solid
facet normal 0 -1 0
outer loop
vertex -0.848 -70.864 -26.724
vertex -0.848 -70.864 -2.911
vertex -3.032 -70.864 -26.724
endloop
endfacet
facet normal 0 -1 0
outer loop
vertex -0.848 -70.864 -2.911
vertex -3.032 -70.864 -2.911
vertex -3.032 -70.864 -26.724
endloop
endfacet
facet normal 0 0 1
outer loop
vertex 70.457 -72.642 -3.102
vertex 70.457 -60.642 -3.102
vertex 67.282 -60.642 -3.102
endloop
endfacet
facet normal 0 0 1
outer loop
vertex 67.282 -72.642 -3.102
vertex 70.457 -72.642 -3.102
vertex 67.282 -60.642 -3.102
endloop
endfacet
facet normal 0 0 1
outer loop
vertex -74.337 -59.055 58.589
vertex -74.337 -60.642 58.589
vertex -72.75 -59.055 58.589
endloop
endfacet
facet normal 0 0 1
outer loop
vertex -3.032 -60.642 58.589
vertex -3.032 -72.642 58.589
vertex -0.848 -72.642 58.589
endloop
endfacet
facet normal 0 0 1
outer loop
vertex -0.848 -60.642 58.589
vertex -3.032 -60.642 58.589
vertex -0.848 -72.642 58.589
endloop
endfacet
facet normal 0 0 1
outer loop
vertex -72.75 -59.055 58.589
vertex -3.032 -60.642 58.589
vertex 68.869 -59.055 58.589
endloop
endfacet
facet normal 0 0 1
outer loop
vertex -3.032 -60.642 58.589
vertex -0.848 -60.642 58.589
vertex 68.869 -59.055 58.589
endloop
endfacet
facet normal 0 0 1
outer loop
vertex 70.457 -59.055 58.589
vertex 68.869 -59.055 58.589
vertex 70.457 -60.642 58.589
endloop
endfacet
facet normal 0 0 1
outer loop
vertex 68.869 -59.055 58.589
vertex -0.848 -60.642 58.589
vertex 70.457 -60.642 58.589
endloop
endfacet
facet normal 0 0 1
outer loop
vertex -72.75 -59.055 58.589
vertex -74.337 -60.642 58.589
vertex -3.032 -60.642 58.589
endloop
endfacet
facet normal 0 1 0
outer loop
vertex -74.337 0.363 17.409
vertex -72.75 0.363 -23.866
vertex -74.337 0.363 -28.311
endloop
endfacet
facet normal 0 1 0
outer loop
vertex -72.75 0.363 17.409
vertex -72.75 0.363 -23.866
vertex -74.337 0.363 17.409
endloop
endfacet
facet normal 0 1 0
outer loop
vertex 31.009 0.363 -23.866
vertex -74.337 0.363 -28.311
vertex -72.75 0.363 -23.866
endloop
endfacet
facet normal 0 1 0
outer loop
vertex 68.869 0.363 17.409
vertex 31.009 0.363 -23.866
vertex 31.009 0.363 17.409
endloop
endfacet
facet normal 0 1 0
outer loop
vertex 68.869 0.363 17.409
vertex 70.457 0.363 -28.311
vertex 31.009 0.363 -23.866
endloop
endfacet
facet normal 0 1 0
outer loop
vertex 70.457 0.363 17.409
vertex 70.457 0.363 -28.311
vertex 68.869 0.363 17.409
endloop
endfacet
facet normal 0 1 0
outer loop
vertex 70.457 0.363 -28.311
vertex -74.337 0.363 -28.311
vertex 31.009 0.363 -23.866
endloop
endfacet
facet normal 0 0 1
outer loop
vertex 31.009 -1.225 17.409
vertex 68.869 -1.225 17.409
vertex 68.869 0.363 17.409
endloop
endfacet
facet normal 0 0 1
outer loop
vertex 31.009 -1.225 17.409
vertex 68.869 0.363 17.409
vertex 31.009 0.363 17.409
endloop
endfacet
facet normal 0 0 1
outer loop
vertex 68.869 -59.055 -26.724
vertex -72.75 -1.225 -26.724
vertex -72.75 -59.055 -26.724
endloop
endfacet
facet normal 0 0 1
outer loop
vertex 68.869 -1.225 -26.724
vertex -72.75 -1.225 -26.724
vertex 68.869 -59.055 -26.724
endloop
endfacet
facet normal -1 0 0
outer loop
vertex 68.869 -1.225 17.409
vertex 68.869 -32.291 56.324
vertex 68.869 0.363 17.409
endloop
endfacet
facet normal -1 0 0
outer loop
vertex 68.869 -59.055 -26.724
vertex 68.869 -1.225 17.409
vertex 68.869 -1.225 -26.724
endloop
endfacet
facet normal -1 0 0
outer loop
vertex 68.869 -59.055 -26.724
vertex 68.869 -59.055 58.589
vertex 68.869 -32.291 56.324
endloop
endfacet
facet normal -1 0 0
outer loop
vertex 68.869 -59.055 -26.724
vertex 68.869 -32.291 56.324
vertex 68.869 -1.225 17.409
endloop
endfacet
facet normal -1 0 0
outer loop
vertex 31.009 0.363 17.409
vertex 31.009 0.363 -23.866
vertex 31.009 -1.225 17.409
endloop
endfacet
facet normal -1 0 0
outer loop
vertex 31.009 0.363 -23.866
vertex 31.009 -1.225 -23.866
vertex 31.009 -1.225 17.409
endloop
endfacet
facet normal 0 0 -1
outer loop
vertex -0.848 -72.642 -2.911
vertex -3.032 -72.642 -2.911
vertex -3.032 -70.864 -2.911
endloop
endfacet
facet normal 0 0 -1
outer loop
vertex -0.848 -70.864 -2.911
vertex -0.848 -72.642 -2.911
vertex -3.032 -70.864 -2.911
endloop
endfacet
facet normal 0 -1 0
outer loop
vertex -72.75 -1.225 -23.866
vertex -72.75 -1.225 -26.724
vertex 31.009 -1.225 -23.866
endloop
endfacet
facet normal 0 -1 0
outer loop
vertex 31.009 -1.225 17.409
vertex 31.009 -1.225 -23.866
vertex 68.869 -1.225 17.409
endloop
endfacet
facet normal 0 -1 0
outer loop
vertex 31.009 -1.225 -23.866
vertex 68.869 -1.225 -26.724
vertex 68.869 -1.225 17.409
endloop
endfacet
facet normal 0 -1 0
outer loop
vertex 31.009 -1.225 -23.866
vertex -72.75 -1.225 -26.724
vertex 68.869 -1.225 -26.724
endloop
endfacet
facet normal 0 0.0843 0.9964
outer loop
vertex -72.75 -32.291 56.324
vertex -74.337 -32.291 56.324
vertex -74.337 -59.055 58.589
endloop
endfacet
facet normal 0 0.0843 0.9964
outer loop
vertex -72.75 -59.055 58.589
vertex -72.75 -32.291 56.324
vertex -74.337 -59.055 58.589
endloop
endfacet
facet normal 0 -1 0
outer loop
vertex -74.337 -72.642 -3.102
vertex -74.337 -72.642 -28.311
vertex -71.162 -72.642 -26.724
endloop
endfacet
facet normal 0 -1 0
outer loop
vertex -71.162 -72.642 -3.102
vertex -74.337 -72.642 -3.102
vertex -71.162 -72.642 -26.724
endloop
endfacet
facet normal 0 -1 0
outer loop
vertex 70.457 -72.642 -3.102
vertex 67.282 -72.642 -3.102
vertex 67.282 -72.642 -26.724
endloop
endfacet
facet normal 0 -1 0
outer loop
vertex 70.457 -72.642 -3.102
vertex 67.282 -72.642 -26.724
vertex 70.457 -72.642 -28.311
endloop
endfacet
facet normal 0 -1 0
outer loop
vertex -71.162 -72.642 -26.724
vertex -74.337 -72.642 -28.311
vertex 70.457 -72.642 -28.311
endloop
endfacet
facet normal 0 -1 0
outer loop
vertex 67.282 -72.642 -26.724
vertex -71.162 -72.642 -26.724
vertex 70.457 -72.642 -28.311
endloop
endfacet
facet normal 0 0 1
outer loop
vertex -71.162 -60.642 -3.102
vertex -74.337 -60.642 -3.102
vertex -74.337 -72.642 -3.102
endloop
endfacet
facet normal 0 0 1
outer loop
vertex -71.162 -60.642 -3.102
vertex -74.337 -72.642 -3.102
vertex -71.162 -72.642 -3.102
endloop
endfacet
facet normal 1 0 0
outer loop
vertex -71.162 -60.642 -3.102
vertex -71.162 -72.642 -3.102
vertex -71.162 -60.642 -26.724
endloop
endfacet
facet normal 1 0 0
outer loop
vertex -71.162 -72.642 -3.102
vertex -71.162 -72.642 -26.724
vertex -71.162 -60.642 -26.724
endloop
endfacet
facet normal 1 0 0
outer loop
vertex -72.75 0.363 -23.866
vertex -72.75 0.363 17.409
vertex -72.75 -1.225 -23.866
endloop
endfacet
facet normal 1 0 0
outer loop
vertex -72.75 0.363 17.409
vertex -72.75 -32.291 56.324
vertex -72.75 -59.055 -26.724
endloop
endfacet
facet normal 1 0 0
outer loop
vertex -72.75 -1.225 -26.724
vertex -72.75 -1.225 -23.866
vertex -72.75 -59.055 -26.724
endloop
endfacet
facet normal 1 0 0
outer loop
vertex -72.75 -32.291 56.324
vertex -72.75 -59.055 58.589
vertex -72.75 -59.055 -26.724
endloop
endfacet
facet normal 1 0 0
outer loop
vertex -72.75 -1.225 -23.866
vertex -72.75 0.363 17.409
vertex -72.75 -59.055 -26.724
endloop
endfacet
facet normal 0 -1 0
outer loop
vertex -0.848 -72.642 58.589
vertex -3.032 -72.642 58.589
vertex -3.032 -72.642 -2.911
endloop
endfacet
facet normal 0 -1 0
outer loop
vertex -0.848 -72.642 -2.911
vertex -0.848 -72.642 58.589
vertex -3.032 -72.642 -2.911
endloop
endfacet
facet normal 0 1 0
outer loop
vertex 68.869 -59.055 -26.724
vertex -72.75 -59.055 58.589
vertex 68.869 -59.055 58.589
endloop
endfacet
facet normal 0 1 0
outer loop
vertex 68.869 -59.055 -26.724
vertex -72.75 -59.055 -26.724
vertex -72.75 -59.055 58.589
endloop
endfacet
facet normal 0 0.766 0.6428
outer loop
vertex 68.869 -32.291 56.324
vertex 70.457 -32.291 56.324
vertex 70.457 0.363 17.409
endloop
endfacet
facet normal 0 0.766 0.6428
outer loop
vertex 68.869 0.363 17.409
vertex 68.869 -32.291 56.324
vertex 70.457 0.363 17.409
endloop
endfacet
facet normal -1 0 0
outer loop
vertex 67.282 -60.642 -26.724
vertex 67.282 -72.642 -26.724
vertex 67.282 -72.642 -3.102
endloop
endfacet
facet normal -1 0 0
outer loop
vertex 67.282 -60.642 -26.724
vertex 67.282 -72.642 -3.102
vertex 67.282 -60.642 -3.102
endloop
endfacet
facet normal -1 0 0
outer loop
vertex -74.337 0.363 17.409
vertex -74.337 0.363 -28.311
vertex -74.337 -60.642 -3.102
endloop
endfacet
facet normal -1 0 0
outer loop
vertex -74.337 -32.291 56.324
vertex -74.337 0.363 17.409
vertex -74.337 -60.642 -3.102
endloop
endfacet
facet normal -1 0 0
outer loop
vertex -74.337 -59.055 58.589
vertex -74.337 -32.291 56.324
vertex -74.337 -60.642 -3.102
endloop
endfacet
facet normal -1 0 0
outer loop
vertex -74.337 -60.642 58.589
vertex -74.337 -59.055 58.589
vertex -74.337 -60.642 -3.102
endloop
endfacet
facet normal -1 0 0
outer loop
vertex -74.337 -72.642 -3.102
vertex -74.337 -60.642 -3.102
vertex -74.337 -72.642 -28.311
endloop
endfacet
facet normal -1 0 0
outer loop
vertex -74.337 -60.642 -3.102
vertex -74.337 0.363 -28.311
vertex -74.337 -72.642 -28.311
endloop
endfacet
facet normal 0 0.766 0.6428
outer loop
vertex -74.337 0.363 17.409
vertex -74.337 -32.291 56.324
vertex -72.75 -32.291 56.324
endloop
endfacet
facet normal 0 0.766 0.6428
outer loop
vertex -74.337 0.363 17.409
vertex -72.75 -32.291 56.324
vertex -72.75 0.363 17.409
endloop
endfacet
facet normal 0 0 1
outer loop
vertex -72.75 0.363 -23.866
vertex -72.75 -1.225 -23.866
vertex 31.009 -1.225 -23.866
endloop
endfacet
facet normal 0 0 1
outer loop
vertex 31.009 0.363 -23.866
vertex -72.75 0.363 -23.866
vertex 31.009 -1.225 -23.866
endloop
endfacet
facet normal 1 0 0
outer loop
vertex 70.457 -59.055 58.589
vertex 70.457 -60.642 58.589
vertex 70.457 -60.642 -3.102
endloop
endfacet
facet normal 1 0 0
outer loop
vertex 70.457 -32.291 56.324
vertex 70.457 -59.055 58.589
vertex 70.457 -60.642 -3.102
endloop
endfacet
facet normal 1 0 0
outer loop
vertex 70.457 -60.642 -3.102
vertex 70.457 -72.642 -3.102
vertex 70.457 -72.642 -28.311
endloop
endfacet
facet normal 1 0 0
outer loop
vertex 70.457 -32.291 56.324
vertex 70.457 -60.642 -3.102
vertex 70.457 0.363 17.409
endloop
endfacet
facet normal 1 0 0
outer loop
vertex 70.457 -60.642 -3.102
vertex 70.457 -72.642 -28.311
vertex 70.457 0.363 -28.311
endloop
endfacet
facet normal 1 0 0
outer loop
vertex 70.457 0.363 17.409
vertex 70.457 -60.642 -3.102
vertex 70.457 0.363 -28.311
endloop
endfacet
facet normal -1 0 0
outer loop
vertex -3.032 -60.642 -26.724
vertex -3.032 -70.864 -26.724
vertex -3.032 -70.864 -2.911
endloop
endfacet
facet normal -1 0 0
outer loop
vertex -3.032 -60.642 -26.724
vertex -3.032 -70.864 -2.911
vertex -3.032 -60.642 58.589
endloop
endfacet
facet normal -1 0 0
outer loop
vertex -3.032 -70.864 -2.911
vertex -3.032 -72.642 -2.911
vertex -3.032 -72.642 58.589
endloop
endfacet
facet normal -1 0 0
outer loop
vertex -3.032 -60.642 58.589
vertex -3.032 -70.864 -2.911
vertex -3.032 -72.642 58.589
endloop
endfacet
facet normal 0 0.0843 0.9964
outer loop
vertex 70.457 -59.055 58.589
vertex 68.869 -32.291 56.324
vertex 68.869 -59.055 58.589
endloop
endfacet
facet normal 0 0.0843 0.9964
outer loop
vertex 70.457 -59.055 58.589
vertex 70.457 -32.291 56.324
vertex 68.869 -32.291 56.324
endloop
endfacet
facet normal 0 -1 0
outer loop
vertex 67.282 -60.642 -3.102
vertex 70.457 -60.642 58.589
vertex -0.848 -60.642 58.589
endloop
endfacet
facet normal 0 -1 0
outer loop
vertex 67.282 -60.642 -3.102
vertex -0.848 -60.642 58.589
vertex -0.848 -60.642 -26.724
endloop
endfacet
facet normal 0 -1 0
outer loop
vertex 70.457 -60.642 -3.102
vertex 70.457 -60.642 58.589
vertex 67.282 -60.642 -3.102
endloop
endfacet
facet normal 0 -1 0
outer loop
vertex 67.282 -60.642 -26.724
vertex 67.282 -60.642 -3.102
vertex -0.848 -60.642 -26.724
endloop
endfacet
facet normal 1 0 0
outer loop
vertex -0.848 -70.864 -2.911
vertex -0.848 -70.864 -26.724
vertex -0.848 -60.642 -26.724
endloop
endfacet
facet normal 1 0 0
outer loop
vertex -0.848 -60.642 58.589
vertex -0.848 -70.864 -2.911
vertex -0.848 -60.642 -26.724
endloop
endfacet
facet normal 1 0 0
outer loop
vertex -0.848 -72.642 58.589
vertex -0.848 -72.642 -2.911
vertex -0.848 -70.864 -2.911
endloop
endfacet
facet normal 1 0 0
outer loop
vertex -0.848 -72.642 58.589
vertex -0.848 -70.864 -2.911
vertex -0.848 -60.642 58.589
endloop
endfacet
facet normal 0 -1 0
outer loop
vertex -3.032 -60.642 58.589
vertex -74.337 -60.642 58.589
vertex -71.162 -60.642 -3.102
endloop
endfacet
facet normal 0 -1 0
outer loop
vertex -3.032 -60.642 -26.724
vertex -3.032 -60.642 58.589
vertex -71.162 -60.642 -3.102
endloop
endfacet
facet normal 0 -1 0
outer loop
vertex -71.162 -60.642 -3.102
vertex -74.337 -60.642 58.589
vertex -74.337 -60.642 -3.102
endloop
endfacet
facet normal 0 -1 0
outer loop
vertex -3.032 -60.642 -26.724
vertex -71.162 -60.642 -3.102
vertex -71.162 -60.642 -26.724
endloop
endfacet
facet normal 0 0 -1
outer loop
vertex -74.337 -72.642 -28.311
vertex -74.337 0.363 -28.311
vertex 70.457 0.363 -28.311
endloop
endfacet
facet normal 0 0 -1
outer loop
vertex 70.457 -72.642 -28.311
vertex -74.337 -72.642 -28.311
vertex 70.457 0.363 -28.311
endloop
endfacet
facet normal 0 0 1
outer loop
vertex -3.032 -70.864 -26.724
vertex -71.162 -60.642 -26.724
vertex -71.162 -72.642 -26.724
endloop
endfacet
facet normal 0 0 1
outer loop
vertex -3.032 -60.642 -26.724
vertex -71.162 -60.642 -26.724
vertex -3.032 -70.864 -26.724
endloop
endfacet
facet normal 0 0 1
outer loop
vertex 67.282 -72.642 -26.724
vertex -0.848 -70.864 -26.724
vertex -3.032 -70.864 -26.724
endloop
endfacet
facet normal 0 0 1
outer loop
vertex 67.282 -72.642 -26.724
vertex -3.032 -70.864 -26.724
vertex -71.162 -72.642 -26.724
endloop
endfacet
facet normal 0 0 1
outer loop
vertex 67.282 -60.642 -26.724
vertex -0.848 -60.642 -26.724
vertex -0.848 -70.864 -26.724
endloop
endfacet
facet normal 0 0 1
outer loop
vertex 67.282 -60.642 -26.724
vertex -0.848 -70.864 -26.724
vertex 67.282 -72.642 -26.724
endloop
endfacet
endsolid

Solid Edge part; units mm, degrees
sketch "Sketch1" plane through (33.0178, -67.9125, -28.311) normal (0, 0, -1) x (1, 0, 0)
  line L0 (-107.3551, -66.6879) -> (-107.3551, 4.73)
  line L1 (-107.3551, 4.73) -> (37.4389, 4.73)
  line L2 (37.4389, 4.73) -> (37.4389, -66.6879)
  line L3 (37.4389, -66.6879) -> (-107.3551, -66.6879)
extrude "bottom" add sketch "Sketch1" against normal blind 1.5875
sketch "Sketch2" plane through (-4.9364, -1.2246, -1.8296) normal (0, 1, 0) x (-1, 0, 0)
  line L0 (-75.3931, 19.2386) -> (-75.3931, 0.7937)
  line L1 (-75.3931, 0.7937) -> (-75.3931, -26.4814)
  line L2 (-75.3931, -26.4814) -> (69.4009, -26.4814)
  line L3 (69.4009, 0.7937) -> (69.4009, -26.4814)
  line L4 (69.4009, 19.2386) -> (69.4009, 0.7937)
  line L5 (-75.3931, 19.2386) -> (69.4009, 19.2386)
extrude "back" add sketch "Sketch2" along normal blind 1.5875
sketch "Sketch3" plane through (33.0178, -60.6425, 33.925) normal (0, 1, 0) x (-1, 0, 0)
  line L0 (35.5, 24.664) -> (107.2281, 24.664)
  line L1 (107.2281, -30.75) -> (107.2281, 24.664)
  line L2 (107.2281, -30.75) -> (107.2281, -62.236)
  line L3 (107.2281, -62.236) -> (-37.3119, -62.236)
  line L4 (-37.3119, -62.236) -> (-37.3119, -30.75)
  line L5 (-37.3119, 24.664) -> (-37.3119, -30.75)
  line L6 (35.5, 24.664) -> (-37.3119, 24.664)
extrude "front_sub_panel" add sketch "Sketch3" along normal blind 1.5875
extrude "front_panel" [suppressed]
sketch "Sketch4" plane through (-3.0325, -72.0075, 33.8361) normal (1, 0, 0) x (0, 0, -1)
  line L0 (-24.7529, -0.635) -> (36.7471, -0.635)
  line L1 (36.7471, -0.635) -> (36.7471, 1.143)
  line L2 (36.7471, 1.143) -> (62.1471, 1.143)
  line L3 (62.1471, 12.9525) -> (62.1471, 1.143)
  line L4 (-24.7529, 12.9525) -> (62.1471, 12.9525)
  line L5 (-24.7529, 12.9525) -> (-24.7529, -0.635)
extrude "Protrusion1" add sketch "Sketch4" along normal up to vertex (2.1844 mm away)
sketch "Sketch5" plane through (-1.9403, -36.9336, -26.7235) normal (0, 0, 1) x (1, 0, 0)
  line L0 (-69.222, -35.7089) -> (-69.222, -22.1214)
  line L1 (-69.222, -22.1214) -> (-72.397, -22.1214)
  line L2 (-72.397, -22.1214) -> (-72.397, -35.7089)
  line L3 (-72.397, -35.7089) -> (-69.222, -35.7089)
  line L4 (69.222, -22.1214) -> (72.397, -22.1214)
  line L5 (72.397, -22.1214) -> (72.397, -35.7089)
  line L6 (72.397, -35.7089) -> (69.222, -35.7089)
  line L7 (69.222, -35.7089) -> (69.222, -22.1214)
  dimension "D1" = 3.175
extrude "sub_panel_sides" add sketch "Sketch5" along normal blind 23.622
sketch "Sketch6" plane through (70.4567, -36.1398, -5.451) normal (1, 0, 0) x (0, 1, 0)
  line L0 (3.8491, 61.7751) -> (36.5027, 22.86)
  line L1 (36.5027, 22.86) -> (36.5027, -22.86)
  line L2 (36.5027, -22.86) -> (-24.5027, -22.86)
  line L3 (-24.5027, 8.626) -> (-24.5027, -22.86)
  line L4 (-24.5027, 64.04) -> (-24.5027, 8.626)
  line L5 (-22.9152, 64.04) -> (-24.5027, 64.04)
  line L6 (3.8491, 61.7751) -> (-22.9152, 64.04)
extrude "ExtrudedProtrusion_7" add sketch "Sketch6" against normal blind 1.5875
sketch "Sketch7" plane through (-74.3373, -36.1398, -5.451) normal (-1, 0, 0) x (0, -1, 0)
  line L0 (22.9152, 64.04) -> (24.5027, 64.04)
  line L1 (-3.8491, 61.7751) -> (22.9152, 64.04)
  line L2 (-3.8491, 61.7751) -> (-36.5027, 22.86)
  line L3 (-36.5027, 22.86) -> (-36.5027, -22.86)
  line L4 (-36.5027, -22.86) -> (24.5027, -22.86)
  line L5 (24.5027, 8.626) -> (24.5027, -22.86)
  line L6 (24.5027, 64.04) -> (24.5027, 8.626)
extrude "ExtrudedProtrusion_8" add sketch "Sketch7" against normal blind 1.5875
sketch "Sketch8" plane through (-1.9403, -59.055, 15.9327) normal (0, 1, 0) x (-1, 0, 0)
  line L0 (-32.9495, -39.7988) -> (-32.9495, 1.4762)
  line L1 (-32.9495, 1.4762) -> (70.8095, 1.4762)
  line L2 (70.8095, 1.4762) -> (70.8095, -39.7988)
  line L3 (70.8095, -39.7988) -> (-32.9495, -39.7988)
extrude "Cutout1" cut sketch "Sketch8" along normal up to next
